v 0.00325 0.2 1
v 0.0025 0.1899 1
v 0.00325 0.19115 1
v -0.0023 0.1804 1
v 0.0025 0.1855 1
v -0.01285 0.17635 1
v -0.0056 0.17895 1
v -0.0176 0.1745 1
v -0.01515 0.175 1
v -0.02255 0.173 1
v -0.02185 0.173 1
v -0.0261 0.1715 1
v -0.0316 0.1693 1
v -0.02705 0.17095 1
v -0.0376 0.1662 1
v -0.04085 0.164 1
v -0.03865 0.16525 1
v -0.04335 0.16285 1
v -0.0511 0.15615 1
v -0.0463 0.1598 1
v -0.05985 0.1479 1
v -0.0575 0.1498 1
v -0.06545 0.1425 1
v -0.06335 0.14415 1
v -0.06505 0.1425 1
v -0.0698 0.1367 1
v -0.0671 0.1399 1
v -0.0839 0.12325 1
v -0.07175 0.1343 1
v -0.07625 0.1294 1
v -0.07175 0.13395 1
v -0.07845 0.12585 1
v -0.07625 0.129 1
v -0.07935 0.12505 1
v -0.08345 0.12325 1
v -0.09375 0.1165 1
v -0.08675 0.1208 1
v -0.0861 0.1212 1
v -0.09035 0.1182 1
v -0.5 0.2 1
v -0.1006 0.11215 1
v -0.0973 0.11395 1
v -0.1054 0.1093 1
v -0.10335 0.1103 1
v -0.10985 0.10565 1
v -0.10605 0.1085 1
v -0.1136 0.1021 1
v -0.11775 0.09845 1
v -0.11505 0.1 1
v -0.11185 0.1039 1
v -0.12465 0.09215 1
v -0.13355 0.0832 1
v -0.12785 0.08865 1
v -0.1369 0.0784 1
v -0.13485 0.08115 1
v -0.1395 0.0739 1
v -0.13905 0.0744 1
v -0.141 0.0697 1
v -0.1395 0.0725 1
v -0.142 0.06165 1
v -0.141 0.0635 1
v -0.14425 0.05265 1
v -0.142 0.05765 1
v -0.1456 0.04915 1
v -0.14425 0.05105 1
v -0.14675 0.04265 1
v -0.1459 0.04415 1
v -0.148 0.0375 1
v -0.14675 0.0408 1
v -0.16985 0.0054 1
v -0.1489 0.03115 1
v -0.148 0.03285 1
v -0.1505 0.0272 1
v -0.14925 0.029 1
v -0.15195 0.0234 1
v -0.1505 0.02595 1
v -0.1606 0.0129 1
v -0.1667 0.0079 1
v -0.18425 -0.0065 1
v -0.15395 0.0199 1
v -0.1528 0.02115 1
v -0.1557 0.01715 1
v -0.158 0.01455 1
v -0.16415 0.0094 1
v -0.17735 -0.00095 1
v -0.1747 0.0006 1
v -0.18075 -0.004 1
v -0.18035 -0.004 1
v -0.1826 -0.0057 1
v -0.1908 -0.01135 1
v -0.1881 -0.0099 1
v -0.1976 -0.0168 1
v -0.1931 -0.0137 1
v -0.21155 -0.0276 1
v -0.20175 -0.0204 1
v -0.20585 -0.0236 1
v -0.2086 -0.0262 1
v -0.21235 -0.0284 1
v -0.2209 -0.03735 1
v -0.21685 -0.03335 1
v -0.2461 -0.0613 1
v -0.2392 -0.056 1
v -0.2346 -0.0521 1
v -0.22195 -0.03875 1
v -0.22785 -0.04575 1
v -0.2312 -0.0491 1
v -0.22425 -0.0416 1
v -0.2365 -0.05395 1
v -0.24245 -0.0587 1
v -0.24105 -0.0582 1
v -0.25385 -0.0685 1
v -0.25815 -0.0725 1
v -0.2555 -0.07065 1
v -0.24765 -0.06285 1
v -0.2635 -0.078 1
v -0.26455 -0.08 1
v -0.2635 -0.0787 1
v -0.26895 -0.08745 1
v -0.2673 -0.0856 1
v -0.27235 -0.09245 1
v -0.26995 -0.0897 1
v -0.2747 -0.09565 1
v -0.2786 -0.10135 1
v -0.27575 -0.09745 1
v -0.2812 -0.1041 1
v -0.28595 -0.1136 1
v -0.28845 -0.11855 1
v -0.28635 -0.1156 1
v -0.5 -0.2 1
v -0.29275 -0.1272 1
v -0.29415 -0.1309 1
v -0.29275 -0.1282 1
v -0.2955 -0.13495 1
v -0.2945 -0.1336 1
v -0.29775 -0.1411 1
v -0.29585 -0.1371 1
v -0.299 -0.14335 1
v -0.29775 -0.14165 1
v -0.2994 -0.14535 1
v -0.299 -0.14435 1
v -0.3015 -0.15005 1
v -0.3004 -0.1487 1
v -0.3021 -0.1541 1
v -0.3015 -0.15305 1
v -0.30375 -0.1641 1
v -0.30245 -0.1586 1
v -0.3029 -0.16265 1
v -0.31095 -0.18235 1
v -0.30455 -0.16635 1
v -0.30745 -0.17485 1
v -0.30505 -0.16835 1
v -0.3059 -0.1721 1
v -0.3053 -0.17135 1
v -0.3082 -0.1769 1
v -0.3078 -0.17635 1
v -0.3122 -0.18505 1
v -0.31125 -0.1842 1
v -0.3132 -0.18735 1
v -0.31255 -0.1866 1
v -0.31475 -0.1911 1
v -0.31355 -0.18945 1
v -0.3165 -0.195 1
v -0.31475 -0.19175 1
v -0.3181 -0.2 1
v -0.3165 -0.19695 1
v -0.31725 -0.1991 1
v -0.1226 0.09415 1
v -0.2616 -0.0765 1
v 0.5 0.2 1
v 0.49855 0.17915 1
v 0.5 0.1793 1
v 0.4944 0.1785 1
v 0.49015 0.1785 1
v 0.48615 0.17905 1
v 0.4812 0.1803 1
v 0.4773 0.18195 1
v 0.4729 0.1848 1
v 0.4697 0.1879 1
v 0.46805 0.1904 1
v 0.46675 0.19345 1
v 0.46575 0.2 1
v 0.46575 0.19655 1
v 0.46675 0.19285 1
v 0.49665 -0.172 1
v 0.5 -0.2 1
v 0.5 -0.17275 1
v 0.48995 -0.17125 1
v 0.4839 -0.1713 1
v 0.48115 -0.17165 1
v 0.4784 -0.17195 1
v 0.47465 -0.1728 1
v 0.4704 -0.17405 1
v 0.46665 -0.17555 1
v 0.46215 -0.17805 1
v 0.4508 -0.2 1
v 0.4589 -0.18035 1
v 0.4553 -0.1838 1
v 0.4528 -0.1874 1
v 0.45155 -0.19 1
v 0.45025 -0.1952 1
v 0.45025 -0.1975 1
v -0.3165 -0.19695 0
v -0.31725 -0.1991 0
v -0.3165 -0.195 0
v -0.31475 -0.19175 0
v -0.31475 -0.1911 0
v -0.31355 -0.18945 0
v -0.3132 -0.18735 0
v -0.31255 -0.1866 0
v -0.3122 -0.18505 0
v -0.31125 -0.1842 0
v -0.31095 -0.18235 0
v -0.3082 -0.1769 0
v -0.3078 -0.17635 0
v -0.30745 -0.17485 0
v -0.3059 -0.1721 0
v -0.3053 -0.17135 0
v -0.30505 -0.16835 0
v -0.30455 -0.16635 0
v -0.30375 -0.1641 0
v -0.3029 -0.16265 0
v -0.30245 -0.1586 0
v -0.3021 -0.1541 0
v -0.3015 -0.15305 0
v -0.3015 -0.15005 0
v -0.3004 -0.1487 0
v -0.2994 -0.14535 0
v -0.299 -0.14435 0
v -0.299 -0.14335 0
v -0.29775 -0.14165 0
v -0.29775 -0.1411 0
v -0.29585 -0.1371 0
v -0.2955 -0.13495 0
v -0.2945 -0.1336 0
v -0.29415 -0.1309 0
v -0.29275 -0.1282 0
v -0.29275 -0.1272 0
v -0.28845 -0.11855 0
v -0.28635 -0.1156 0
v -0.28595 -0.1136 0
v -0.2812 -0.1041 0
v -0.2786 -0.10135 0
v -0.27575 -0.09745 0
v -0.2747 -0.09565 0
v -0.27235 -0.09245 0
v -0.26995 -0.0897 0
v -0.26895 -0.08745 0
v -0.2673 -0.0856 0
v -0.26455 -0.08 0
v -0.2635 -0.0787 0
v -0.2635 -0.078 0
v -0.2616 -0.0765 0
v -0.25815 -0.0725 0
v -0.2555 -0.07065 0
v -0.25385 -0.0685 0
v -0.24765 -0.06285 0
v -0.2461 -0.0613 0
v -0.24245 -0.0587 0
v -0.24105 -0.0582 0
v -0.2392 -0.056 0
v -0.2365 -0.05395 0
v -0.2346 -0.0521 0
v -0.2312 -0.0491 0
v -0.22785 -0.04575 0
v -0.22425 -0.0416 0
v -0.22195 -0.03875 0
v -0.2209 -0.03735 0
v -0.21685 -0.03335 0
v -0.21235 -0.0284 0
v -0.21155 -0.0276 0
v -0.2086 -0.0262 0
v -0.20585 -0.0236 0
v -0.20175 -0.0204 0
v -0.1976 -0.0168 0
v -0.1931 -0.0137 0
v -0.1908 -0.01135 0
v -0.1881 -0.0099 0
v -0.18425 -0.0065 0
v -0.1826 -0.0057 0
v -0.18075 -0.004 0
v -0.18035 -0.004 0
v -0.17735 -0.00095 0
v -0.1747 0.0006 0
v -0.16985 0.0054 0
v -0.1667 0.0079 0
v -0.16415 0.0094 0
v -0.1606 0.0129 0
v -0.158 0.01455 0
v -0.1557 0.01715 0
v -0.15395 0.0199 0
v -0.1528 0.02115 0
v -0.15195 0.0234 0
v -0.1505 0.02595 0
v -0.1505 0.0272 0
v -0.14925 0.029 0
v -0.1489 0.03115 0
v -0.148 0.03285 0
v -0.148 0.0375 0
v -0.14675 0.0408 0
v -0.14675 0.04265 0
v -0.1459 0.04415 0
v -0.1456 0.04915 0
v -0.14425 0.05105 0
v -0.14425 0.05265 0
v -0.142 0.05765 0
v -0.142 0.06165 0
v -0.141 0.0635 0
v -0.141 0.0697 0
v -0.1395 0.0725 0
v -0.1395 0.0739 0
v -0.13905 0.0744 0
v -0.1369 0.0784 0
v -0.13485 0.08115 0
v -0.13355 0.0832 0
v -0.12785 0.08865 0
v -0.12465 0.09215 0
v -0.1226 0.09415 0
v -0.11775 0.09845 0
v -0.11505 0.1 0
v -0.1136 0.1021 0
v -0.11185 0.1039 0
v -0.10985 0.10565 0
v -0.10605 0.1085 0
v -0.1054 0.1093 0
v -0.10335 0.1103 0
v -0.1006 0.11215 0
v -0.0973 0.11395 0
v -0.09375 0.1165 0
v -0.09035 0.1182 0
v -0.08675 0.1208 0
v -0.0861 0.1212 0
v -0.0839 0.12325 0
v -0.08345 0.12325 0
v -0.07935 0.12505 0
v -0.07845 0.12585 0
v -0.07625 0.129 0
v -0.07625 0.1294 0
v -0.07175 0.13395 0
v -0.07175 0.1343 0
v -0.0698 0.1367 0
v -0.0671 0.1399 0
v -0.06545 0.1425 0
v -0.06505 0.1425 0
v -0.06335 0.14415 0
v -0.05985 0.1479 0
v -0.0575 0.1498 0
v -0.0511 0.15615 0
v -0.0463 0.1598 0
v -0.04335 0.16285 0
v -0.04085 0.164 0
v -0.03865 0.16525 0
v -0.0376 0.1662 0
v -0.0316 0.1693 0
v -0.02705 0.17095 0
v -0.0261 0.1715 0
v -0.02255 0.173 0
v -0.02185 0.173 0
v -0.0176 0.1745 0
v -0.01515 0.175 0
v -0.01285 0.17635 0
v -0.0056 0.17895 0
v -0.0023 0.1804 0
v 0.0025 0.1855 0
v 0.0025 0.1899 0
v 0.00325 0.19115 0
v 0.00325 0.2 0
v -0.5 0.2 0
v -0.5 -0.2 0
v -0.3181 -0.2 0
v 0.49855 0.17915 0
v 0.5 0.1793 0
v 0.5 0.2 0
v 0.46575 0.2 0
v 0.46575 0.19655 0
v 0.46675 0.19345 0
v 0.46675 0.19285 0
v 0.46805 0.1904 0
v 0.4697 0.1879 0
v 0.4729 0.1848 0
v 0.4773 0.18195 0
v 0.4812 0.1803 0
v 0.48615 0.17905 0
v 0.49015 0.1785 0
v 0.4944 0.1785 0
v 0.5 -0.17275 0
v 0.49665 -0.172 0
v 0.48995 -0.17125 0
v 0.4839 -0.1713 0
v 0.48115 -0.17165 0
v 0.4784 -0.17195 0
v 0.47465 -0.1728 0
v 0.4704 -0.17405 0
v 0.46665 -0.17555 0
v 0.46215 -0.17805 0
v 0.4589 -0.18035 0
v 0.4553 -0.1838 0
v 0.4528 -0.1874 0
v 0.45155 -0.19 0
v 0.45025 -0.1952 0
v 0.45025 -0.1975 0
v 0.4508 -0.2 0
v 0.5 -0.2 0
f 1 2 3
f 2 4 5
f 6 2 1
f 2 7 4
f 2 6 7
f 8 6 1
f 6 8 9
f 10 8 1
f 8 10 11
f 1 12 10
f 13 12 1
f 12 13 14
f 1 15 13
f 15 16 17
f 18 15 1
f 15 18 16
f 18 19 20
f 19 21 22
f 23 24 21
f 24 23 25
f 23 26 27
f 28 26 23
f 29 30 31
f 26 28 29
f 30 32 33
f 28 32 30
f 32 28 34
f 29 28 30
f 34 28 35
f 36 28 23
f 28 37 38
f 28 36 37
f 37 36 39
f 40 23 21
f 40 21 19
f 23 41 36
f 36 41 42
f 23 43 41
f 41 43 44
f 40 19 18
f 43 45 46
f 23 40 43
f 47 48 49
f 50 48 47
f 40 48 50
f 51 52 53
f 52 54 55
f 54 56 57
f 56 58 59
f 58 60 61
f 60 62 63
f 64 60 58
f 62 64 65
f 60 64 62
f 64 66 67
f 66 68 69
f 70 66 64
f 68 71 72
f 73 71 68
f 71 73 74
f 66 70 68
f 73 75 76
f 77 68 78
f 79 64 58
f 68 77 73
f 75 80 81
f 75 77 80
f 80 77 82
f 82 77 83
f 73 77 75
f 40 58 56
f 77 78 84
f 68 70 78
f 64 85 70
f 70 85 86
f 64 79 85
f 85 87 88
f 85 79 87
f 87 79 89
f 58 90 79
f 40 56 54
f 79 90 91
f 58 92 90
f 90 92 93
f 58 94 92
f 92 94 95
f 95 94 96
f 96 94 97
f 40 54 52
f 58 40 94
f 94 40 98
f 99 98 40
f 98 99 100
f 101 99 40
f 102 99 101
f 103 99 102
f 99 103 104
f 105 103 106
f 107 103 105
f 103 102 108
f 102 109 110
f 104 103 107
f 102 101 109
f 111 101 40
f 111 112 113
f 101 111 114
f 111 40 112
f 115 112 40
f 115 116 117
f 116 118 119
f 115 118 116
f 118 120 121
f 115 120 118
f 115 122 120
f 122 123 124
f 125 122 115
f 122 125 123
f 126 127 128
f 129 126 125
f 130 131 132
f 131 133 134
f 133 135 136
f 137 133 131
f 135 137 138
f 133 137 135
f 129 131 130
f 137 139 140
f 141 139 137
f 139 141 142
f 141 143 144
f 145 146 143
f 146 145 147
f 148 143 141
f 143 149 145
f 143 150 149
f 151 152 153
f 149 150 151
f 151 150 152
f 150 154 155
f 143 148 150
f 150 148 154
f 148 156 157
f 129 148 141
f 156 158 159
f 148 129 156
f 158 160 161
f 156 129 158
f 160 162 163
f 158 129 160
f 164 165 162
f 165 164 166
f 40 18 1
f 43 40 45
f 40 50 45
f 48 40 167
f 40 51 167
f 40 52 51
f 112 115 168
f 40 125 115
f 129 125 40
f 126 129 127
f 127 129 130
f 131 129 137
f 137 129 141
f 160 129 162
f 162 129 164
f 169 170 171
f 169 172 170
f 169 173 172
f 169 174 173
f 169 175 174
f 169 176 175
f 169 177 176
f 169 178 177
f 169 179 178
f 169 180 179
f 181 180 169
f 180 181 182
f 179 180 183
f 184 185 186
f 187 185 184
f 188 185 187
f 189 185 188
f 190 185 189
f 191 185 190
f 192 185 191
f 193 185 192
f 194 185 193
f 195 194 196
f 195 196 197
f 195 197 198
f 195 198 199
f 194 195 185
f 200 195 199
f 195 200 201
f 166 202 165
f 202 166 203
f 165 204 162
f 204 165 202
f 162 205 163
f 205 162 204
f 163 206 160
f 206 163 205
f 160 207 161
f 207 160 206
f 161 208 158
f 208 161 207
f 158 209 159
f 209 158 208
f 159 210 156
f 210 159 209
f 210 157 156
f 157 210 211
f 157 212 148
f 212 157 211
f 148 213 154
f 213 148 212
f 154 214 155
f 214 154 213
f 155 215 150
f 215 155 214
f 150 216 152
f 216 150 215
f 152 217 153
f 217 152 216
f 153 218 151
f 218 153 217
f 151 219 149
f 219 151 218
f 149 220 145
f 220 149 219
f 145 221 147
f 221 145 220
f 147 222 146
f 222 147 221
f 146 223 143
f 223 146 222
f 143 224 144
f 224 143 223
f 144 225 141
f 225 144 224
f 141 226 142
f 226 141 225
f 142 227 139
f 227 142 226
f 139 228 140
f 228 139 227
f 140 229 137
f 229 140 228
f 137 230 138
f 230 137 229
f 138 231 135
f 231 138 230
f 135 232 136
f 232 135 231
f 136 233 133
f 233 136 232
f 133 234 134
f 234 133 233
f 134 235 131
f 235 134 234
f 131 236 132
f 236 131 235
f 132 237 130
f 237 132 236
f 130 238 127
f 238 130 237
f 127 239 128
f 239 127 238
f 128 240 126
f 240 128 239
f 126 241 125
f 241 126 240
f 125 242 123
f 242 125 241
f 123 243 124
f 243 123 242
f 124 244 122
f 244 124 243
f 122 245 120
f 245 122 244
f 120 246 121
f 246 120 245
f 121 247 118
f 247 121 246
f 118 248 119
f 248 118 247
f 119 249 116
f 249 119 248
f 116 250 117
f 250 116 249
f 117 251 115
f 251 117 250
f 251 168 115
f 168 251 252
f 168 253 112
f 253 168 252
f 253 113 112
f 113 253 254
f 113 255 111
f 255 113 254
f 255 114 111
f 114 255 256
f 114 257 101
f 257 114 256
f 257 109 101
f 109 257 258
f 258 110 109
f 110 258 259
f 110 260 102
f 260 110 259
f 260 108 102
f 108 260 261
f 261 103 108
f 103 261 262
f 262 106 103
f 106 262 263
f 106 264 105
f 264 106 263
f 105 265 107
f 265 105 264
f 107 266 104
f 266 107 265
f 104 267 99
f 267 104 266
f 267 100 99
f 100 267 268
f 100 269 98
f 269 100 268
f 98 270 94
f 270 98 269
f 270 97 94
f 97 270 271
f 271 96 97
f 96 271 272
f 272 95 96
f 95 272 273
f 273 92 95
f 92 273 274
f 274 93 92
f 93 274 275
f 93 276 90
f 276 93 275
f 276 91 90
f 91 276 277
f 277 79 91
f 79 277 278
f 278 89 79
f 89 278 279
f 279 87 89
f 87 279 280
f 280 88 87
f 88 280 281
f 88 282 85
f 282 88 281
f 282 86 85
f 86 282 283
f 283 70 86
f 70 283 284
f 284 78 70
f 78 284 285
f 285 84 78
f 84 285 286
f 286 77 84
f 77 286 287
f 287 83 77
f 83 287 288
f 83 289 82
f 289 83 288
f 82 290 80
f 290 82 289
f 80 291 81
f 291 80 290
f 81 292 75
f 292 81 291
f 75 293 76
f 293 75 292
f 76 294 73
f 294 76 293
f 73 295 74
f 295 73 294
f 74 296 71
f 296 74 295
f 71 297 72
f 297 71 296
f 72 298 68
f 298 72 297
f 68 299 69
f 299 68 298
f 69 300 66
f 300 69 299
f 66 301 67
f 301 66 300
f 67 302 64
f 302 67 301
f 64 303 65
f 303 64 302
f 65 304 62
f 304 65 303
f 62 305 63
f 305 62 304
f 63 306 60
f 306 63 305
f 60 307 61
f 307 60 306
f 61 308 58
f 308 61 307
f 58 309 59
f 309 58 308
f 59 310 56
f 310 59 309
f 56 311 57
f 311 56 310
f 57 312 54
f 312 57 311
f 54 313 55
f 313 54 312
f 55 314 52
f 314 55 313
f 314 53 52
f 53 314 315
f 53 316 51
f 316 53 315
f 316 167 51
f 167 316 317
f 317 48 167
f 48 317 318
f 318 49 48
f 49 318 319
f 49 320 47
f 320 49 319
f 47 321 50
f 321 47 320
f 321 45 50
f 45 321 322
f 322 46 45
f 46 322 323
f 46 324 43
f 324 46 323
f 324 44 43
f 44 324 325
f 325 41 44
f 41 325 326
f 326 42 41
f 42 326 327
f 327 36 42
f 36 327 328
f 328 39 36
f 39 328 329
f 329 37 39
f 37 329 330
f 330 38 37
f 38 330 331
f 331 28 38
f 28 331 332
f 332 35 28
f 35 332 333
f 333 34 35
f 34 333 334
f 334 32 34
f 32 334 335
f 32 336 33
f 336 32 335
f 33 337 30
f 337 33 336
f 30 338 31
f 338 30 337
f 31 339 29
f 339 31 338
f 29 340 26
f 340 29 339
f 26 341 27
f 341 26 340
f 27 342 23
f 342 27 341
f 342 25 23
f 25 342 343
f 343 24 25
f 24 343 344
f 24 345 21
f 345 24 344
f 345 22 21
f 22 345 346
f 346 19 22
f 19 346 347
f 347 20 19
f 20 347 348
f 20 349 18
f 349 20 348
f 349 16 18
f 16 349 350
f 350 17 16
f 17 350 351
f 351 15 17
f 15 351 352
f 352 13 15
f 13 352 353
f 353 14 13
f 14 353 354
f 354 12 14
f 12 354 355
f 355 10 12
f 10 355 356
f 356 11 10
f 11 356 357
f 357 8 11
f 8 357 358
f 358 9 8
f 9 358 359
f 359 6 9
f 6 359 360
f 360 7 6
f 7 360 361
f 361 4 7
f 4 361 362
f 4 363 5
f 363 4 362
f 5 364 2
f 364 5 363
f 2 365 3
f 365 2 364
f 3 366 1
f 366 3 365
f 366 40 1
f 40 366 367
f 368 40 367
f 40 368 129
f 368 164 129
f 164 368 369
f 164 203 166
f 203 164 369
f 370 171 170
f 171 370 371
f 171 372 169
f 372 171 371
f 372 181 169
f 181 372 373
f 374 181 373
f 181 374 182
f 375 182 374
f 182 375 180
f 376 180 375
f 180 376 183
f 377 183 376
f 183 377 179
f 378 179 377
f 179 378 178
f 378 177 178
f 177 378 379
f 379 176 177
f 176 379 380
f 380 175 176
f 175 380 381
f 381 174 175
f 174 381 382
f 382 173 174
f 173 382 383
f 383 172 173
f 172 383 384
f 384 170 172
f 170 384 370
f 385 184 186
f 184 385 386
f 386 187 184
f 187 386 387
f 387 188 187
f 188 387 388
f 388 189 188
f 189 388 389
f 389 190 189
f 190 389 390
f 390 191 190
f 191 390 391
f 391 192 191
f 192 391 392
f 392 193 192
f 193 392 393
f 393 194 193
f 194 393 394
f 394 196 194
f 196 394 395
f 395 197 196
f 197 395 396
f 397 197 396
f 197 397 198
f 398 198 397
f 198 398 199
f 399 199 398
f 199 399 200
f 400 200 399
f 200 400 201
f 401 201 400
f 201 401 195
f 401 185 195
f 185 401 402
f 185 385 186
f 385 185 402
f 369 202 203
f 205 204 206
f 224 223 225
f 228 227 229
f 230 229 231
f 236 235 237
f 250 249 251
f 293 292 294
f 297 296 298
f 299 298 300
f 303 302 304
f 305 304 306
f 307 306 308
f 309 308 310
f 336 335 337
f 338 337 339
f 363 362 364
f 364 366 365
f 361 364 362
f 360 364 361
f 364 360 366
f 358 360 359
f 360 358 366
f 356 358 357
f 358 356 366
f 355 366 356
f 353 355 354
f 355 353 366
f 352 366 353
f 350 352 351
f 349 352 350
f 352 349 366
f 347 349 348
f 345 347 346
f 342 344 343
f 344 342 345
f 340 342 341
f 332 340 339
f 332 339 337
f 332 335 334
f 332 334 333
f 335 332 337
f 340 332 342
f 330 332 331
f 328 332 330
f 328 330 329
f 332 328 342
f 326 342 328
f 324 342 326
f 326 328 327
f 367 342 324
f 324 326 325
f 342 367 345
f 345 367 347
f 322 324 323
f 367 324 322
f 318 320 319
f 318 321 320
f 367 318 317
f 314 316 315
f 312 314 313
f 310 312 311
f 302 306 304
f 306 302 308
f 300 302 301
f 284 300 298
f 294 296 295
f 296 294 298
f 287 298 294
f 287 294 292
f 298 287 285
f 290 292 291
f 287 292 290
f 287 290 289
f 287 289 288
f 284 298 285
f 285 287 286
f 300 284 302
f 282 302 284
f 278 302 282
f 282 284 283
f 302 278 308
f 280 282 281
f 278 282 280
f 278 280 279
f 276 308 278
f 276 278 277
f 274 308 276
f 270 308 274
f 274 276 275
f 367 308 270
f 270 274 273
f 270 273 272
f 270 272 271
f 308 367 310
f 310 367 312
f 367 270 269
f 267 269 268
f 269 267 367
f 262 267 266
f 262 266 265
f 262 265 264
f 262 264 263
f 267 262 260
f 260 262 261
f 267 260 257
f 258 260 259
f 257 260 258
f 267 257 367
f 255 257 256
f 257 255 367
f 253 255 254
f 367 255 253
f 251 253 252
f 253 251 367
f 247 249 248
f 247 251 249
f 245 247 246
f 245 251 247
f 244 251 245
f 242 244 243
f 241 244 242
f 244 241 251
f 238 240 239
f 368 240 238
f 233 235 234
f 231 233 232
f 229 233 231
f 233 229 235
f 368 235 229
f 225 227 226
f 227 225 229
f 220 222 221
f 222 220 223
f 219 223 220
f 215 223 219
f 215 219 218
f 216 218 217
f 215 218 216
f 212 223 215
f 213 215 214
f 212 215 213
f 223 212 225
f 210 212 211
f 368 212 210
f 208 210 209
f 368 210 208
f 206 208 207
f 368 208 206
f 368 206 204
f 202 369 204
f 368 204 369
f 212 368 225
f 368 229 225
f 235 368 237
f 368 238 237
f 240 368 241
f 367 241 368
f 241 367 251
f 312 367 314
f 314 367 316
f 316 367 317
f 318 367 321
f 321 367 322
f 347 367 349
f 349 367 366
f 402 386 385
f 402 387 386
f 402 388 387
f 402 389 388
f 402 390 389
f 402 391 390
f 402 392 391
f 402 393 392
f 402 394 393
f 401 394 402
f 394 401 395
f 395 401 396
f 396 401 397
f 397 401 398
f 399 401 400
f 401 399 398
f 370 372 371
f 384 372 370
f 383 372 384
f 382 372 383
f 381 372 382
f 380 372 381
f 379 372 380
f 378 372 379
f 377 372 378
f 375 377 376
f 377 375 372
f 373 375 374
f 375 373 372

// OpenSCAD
module card5yellow_1()
{
 /* Generated by trace2scad version 20150415
    http://aggregate.org/MAKE/TRACE2SCAD/
    Optimized model has 203/417 original points
 */
 color([0.5, 0.5, 0.5])
 assign(minx=0) /* polygon minx=0 */
 assign(miny=0) /* polygon miny=0 */
 assign(maxx=20000) /* polygon maxx=20000 */
 assign(maxy=8000) /* polygon maxy=8000 */
 assign(dx=maxx-minx)
 assign(dy=maxy-miny)
 assign(maxd=((dx>dy)?dx:dy))
 scale([1/maxd, 1/maxd, 1])
 translate([-minx-dx/2, -miny-dy/2, 0])
 linear_extrude(height=1, convexity=203)
 union() {
  union() {
   polygon([[0,4000],[0,0],[3638,0],[3655,18],[3670,61],[3670,100],[3705,165],[3705,178],[3729,211],[3736,253],[3749,268],[3756,299],[3775,316],[3781,353],[3836,462],[3844,473],[3851,503],[3882,558],[3894,573],[3899,633],[3909,673],[3925,718],[3942,747],[3951,828],[3958,918],[3970,939],[3970,999],[3992,1026],[4012,1093],[4020,1113],[4020,1133],[4045,1167],[4045,1178],[4083,1258],[4090,1301],[4110,1328],[4117,1382],[4145,1436],[4145,1456],[4231,1629],[4273,1688],[4281,1728],[4376,1918],[4428,1973],[4485,2051],[4506,2087],[4553,2151],[4601,2206],[4621,2251],[4654,2288],[4709,2400],[4730,2426],[4730,2440],[4768,2470],[4837,2550],[4890,2587],[4923,2630],[5047,2743],[5078,2774],[5151,2826],[5179,2836],[5216,2880],[5270,2921],[5308,2958],[5376,3018],[5443,3085],[5515,3168],[5561,3225],[5582,3253],[5663,3333],[5753,3432],[5769,3448],[5828,3476],[5883,3528],[5965,3592],[6048,3664],[6138,3726],[6184,3773],[6238,3802],[6315,3870],[6348,3886],[6385,3920],[6393,3920],[6453,3981],[6506,4012],[6603,4108],[6666,4158],[6717,4188],[6788,4258],[6840,4291],[6886,4343],[6921,4398],[6944,4423],[6961,4468],[6990,4519],[6990,4544],[7015,4580],[7022,4623],[7040,4657],[7040,4750],[7065,4816],[7065,4853],[7082,4883],[7088,4983],[7115,5021],[7115,5053],[7160,5153],[7160,5233],[7180,5270],[7180,5394],[7210,5450],[7210,5478],[7219,5488],[7262,5568],[7303,5623],[7329,5664],[7443,5773],[7507,5843],[7548,5883],[7645,5969],[7699,6000],[7728,6042],[7763,6078],[7803,6113],[7879,6170],[7892,6186],[7933,6206],[7988,6243],[8054,6279],[8125,6330],[8193,6364],[8265,6416],[8278,6424],[8322,6465],[8331,6465],[8413,6501],[8431,6517],[8475,6580],[8475,6588],[8565,6679],[8565,6686],[8604,6734],[8658,6798],[8691,6850],[8699,6850],[8733,6883],[8803,6958],[8850,6996],[8978,7123],[9074,7196],[9133,7257],[9183,7280],[9227,7305],[9248,7324],[9368,7386],[9459,7419],[9478,7430],[9549,7460],[9563,7460],[9648,7490],[9697,7500],[9743,7527],[9888,7579],[9954,7608],[10050,7710],[10050,7798],[10065,7823],[10065,8000],[0,8000]], convexity=5);
   polygon([[19315,7966],[19315,7931],[19335,7869],[19335,7857],[19361,7808],[19394,7758],[19458,7696],[19546,7639],[19624,7606],[19723,7581],[19803,7570],[19888,7570],[19971,7583],[20000,7586],[20000,8000],[19315,8000]], convexity=5);
   polygon([[19623,567],[19568,561],[19493,544],[19408,519],[19333,489],[19243,439],[19178,393],[19106,324],[19056,252],[19031,200],[19005,96],[19005,50],[19016,0],[20000,0],[20000,545],[19933,560],[19799,575],[19678,574]], convexity=7);
  }
 }
}

module card5yellow()
{
 /* all layers combined, scaled to within a 1mm cube */
 scale([1, 1, 1/1])
 difference() {
  union() {
   scale([1,1,2]) translate([0,0,-0.5]) card5yellow_1();
  }
  translate([0,0,-2]) cube([2,2,4],center=true);
 }
}
card5yellow();
